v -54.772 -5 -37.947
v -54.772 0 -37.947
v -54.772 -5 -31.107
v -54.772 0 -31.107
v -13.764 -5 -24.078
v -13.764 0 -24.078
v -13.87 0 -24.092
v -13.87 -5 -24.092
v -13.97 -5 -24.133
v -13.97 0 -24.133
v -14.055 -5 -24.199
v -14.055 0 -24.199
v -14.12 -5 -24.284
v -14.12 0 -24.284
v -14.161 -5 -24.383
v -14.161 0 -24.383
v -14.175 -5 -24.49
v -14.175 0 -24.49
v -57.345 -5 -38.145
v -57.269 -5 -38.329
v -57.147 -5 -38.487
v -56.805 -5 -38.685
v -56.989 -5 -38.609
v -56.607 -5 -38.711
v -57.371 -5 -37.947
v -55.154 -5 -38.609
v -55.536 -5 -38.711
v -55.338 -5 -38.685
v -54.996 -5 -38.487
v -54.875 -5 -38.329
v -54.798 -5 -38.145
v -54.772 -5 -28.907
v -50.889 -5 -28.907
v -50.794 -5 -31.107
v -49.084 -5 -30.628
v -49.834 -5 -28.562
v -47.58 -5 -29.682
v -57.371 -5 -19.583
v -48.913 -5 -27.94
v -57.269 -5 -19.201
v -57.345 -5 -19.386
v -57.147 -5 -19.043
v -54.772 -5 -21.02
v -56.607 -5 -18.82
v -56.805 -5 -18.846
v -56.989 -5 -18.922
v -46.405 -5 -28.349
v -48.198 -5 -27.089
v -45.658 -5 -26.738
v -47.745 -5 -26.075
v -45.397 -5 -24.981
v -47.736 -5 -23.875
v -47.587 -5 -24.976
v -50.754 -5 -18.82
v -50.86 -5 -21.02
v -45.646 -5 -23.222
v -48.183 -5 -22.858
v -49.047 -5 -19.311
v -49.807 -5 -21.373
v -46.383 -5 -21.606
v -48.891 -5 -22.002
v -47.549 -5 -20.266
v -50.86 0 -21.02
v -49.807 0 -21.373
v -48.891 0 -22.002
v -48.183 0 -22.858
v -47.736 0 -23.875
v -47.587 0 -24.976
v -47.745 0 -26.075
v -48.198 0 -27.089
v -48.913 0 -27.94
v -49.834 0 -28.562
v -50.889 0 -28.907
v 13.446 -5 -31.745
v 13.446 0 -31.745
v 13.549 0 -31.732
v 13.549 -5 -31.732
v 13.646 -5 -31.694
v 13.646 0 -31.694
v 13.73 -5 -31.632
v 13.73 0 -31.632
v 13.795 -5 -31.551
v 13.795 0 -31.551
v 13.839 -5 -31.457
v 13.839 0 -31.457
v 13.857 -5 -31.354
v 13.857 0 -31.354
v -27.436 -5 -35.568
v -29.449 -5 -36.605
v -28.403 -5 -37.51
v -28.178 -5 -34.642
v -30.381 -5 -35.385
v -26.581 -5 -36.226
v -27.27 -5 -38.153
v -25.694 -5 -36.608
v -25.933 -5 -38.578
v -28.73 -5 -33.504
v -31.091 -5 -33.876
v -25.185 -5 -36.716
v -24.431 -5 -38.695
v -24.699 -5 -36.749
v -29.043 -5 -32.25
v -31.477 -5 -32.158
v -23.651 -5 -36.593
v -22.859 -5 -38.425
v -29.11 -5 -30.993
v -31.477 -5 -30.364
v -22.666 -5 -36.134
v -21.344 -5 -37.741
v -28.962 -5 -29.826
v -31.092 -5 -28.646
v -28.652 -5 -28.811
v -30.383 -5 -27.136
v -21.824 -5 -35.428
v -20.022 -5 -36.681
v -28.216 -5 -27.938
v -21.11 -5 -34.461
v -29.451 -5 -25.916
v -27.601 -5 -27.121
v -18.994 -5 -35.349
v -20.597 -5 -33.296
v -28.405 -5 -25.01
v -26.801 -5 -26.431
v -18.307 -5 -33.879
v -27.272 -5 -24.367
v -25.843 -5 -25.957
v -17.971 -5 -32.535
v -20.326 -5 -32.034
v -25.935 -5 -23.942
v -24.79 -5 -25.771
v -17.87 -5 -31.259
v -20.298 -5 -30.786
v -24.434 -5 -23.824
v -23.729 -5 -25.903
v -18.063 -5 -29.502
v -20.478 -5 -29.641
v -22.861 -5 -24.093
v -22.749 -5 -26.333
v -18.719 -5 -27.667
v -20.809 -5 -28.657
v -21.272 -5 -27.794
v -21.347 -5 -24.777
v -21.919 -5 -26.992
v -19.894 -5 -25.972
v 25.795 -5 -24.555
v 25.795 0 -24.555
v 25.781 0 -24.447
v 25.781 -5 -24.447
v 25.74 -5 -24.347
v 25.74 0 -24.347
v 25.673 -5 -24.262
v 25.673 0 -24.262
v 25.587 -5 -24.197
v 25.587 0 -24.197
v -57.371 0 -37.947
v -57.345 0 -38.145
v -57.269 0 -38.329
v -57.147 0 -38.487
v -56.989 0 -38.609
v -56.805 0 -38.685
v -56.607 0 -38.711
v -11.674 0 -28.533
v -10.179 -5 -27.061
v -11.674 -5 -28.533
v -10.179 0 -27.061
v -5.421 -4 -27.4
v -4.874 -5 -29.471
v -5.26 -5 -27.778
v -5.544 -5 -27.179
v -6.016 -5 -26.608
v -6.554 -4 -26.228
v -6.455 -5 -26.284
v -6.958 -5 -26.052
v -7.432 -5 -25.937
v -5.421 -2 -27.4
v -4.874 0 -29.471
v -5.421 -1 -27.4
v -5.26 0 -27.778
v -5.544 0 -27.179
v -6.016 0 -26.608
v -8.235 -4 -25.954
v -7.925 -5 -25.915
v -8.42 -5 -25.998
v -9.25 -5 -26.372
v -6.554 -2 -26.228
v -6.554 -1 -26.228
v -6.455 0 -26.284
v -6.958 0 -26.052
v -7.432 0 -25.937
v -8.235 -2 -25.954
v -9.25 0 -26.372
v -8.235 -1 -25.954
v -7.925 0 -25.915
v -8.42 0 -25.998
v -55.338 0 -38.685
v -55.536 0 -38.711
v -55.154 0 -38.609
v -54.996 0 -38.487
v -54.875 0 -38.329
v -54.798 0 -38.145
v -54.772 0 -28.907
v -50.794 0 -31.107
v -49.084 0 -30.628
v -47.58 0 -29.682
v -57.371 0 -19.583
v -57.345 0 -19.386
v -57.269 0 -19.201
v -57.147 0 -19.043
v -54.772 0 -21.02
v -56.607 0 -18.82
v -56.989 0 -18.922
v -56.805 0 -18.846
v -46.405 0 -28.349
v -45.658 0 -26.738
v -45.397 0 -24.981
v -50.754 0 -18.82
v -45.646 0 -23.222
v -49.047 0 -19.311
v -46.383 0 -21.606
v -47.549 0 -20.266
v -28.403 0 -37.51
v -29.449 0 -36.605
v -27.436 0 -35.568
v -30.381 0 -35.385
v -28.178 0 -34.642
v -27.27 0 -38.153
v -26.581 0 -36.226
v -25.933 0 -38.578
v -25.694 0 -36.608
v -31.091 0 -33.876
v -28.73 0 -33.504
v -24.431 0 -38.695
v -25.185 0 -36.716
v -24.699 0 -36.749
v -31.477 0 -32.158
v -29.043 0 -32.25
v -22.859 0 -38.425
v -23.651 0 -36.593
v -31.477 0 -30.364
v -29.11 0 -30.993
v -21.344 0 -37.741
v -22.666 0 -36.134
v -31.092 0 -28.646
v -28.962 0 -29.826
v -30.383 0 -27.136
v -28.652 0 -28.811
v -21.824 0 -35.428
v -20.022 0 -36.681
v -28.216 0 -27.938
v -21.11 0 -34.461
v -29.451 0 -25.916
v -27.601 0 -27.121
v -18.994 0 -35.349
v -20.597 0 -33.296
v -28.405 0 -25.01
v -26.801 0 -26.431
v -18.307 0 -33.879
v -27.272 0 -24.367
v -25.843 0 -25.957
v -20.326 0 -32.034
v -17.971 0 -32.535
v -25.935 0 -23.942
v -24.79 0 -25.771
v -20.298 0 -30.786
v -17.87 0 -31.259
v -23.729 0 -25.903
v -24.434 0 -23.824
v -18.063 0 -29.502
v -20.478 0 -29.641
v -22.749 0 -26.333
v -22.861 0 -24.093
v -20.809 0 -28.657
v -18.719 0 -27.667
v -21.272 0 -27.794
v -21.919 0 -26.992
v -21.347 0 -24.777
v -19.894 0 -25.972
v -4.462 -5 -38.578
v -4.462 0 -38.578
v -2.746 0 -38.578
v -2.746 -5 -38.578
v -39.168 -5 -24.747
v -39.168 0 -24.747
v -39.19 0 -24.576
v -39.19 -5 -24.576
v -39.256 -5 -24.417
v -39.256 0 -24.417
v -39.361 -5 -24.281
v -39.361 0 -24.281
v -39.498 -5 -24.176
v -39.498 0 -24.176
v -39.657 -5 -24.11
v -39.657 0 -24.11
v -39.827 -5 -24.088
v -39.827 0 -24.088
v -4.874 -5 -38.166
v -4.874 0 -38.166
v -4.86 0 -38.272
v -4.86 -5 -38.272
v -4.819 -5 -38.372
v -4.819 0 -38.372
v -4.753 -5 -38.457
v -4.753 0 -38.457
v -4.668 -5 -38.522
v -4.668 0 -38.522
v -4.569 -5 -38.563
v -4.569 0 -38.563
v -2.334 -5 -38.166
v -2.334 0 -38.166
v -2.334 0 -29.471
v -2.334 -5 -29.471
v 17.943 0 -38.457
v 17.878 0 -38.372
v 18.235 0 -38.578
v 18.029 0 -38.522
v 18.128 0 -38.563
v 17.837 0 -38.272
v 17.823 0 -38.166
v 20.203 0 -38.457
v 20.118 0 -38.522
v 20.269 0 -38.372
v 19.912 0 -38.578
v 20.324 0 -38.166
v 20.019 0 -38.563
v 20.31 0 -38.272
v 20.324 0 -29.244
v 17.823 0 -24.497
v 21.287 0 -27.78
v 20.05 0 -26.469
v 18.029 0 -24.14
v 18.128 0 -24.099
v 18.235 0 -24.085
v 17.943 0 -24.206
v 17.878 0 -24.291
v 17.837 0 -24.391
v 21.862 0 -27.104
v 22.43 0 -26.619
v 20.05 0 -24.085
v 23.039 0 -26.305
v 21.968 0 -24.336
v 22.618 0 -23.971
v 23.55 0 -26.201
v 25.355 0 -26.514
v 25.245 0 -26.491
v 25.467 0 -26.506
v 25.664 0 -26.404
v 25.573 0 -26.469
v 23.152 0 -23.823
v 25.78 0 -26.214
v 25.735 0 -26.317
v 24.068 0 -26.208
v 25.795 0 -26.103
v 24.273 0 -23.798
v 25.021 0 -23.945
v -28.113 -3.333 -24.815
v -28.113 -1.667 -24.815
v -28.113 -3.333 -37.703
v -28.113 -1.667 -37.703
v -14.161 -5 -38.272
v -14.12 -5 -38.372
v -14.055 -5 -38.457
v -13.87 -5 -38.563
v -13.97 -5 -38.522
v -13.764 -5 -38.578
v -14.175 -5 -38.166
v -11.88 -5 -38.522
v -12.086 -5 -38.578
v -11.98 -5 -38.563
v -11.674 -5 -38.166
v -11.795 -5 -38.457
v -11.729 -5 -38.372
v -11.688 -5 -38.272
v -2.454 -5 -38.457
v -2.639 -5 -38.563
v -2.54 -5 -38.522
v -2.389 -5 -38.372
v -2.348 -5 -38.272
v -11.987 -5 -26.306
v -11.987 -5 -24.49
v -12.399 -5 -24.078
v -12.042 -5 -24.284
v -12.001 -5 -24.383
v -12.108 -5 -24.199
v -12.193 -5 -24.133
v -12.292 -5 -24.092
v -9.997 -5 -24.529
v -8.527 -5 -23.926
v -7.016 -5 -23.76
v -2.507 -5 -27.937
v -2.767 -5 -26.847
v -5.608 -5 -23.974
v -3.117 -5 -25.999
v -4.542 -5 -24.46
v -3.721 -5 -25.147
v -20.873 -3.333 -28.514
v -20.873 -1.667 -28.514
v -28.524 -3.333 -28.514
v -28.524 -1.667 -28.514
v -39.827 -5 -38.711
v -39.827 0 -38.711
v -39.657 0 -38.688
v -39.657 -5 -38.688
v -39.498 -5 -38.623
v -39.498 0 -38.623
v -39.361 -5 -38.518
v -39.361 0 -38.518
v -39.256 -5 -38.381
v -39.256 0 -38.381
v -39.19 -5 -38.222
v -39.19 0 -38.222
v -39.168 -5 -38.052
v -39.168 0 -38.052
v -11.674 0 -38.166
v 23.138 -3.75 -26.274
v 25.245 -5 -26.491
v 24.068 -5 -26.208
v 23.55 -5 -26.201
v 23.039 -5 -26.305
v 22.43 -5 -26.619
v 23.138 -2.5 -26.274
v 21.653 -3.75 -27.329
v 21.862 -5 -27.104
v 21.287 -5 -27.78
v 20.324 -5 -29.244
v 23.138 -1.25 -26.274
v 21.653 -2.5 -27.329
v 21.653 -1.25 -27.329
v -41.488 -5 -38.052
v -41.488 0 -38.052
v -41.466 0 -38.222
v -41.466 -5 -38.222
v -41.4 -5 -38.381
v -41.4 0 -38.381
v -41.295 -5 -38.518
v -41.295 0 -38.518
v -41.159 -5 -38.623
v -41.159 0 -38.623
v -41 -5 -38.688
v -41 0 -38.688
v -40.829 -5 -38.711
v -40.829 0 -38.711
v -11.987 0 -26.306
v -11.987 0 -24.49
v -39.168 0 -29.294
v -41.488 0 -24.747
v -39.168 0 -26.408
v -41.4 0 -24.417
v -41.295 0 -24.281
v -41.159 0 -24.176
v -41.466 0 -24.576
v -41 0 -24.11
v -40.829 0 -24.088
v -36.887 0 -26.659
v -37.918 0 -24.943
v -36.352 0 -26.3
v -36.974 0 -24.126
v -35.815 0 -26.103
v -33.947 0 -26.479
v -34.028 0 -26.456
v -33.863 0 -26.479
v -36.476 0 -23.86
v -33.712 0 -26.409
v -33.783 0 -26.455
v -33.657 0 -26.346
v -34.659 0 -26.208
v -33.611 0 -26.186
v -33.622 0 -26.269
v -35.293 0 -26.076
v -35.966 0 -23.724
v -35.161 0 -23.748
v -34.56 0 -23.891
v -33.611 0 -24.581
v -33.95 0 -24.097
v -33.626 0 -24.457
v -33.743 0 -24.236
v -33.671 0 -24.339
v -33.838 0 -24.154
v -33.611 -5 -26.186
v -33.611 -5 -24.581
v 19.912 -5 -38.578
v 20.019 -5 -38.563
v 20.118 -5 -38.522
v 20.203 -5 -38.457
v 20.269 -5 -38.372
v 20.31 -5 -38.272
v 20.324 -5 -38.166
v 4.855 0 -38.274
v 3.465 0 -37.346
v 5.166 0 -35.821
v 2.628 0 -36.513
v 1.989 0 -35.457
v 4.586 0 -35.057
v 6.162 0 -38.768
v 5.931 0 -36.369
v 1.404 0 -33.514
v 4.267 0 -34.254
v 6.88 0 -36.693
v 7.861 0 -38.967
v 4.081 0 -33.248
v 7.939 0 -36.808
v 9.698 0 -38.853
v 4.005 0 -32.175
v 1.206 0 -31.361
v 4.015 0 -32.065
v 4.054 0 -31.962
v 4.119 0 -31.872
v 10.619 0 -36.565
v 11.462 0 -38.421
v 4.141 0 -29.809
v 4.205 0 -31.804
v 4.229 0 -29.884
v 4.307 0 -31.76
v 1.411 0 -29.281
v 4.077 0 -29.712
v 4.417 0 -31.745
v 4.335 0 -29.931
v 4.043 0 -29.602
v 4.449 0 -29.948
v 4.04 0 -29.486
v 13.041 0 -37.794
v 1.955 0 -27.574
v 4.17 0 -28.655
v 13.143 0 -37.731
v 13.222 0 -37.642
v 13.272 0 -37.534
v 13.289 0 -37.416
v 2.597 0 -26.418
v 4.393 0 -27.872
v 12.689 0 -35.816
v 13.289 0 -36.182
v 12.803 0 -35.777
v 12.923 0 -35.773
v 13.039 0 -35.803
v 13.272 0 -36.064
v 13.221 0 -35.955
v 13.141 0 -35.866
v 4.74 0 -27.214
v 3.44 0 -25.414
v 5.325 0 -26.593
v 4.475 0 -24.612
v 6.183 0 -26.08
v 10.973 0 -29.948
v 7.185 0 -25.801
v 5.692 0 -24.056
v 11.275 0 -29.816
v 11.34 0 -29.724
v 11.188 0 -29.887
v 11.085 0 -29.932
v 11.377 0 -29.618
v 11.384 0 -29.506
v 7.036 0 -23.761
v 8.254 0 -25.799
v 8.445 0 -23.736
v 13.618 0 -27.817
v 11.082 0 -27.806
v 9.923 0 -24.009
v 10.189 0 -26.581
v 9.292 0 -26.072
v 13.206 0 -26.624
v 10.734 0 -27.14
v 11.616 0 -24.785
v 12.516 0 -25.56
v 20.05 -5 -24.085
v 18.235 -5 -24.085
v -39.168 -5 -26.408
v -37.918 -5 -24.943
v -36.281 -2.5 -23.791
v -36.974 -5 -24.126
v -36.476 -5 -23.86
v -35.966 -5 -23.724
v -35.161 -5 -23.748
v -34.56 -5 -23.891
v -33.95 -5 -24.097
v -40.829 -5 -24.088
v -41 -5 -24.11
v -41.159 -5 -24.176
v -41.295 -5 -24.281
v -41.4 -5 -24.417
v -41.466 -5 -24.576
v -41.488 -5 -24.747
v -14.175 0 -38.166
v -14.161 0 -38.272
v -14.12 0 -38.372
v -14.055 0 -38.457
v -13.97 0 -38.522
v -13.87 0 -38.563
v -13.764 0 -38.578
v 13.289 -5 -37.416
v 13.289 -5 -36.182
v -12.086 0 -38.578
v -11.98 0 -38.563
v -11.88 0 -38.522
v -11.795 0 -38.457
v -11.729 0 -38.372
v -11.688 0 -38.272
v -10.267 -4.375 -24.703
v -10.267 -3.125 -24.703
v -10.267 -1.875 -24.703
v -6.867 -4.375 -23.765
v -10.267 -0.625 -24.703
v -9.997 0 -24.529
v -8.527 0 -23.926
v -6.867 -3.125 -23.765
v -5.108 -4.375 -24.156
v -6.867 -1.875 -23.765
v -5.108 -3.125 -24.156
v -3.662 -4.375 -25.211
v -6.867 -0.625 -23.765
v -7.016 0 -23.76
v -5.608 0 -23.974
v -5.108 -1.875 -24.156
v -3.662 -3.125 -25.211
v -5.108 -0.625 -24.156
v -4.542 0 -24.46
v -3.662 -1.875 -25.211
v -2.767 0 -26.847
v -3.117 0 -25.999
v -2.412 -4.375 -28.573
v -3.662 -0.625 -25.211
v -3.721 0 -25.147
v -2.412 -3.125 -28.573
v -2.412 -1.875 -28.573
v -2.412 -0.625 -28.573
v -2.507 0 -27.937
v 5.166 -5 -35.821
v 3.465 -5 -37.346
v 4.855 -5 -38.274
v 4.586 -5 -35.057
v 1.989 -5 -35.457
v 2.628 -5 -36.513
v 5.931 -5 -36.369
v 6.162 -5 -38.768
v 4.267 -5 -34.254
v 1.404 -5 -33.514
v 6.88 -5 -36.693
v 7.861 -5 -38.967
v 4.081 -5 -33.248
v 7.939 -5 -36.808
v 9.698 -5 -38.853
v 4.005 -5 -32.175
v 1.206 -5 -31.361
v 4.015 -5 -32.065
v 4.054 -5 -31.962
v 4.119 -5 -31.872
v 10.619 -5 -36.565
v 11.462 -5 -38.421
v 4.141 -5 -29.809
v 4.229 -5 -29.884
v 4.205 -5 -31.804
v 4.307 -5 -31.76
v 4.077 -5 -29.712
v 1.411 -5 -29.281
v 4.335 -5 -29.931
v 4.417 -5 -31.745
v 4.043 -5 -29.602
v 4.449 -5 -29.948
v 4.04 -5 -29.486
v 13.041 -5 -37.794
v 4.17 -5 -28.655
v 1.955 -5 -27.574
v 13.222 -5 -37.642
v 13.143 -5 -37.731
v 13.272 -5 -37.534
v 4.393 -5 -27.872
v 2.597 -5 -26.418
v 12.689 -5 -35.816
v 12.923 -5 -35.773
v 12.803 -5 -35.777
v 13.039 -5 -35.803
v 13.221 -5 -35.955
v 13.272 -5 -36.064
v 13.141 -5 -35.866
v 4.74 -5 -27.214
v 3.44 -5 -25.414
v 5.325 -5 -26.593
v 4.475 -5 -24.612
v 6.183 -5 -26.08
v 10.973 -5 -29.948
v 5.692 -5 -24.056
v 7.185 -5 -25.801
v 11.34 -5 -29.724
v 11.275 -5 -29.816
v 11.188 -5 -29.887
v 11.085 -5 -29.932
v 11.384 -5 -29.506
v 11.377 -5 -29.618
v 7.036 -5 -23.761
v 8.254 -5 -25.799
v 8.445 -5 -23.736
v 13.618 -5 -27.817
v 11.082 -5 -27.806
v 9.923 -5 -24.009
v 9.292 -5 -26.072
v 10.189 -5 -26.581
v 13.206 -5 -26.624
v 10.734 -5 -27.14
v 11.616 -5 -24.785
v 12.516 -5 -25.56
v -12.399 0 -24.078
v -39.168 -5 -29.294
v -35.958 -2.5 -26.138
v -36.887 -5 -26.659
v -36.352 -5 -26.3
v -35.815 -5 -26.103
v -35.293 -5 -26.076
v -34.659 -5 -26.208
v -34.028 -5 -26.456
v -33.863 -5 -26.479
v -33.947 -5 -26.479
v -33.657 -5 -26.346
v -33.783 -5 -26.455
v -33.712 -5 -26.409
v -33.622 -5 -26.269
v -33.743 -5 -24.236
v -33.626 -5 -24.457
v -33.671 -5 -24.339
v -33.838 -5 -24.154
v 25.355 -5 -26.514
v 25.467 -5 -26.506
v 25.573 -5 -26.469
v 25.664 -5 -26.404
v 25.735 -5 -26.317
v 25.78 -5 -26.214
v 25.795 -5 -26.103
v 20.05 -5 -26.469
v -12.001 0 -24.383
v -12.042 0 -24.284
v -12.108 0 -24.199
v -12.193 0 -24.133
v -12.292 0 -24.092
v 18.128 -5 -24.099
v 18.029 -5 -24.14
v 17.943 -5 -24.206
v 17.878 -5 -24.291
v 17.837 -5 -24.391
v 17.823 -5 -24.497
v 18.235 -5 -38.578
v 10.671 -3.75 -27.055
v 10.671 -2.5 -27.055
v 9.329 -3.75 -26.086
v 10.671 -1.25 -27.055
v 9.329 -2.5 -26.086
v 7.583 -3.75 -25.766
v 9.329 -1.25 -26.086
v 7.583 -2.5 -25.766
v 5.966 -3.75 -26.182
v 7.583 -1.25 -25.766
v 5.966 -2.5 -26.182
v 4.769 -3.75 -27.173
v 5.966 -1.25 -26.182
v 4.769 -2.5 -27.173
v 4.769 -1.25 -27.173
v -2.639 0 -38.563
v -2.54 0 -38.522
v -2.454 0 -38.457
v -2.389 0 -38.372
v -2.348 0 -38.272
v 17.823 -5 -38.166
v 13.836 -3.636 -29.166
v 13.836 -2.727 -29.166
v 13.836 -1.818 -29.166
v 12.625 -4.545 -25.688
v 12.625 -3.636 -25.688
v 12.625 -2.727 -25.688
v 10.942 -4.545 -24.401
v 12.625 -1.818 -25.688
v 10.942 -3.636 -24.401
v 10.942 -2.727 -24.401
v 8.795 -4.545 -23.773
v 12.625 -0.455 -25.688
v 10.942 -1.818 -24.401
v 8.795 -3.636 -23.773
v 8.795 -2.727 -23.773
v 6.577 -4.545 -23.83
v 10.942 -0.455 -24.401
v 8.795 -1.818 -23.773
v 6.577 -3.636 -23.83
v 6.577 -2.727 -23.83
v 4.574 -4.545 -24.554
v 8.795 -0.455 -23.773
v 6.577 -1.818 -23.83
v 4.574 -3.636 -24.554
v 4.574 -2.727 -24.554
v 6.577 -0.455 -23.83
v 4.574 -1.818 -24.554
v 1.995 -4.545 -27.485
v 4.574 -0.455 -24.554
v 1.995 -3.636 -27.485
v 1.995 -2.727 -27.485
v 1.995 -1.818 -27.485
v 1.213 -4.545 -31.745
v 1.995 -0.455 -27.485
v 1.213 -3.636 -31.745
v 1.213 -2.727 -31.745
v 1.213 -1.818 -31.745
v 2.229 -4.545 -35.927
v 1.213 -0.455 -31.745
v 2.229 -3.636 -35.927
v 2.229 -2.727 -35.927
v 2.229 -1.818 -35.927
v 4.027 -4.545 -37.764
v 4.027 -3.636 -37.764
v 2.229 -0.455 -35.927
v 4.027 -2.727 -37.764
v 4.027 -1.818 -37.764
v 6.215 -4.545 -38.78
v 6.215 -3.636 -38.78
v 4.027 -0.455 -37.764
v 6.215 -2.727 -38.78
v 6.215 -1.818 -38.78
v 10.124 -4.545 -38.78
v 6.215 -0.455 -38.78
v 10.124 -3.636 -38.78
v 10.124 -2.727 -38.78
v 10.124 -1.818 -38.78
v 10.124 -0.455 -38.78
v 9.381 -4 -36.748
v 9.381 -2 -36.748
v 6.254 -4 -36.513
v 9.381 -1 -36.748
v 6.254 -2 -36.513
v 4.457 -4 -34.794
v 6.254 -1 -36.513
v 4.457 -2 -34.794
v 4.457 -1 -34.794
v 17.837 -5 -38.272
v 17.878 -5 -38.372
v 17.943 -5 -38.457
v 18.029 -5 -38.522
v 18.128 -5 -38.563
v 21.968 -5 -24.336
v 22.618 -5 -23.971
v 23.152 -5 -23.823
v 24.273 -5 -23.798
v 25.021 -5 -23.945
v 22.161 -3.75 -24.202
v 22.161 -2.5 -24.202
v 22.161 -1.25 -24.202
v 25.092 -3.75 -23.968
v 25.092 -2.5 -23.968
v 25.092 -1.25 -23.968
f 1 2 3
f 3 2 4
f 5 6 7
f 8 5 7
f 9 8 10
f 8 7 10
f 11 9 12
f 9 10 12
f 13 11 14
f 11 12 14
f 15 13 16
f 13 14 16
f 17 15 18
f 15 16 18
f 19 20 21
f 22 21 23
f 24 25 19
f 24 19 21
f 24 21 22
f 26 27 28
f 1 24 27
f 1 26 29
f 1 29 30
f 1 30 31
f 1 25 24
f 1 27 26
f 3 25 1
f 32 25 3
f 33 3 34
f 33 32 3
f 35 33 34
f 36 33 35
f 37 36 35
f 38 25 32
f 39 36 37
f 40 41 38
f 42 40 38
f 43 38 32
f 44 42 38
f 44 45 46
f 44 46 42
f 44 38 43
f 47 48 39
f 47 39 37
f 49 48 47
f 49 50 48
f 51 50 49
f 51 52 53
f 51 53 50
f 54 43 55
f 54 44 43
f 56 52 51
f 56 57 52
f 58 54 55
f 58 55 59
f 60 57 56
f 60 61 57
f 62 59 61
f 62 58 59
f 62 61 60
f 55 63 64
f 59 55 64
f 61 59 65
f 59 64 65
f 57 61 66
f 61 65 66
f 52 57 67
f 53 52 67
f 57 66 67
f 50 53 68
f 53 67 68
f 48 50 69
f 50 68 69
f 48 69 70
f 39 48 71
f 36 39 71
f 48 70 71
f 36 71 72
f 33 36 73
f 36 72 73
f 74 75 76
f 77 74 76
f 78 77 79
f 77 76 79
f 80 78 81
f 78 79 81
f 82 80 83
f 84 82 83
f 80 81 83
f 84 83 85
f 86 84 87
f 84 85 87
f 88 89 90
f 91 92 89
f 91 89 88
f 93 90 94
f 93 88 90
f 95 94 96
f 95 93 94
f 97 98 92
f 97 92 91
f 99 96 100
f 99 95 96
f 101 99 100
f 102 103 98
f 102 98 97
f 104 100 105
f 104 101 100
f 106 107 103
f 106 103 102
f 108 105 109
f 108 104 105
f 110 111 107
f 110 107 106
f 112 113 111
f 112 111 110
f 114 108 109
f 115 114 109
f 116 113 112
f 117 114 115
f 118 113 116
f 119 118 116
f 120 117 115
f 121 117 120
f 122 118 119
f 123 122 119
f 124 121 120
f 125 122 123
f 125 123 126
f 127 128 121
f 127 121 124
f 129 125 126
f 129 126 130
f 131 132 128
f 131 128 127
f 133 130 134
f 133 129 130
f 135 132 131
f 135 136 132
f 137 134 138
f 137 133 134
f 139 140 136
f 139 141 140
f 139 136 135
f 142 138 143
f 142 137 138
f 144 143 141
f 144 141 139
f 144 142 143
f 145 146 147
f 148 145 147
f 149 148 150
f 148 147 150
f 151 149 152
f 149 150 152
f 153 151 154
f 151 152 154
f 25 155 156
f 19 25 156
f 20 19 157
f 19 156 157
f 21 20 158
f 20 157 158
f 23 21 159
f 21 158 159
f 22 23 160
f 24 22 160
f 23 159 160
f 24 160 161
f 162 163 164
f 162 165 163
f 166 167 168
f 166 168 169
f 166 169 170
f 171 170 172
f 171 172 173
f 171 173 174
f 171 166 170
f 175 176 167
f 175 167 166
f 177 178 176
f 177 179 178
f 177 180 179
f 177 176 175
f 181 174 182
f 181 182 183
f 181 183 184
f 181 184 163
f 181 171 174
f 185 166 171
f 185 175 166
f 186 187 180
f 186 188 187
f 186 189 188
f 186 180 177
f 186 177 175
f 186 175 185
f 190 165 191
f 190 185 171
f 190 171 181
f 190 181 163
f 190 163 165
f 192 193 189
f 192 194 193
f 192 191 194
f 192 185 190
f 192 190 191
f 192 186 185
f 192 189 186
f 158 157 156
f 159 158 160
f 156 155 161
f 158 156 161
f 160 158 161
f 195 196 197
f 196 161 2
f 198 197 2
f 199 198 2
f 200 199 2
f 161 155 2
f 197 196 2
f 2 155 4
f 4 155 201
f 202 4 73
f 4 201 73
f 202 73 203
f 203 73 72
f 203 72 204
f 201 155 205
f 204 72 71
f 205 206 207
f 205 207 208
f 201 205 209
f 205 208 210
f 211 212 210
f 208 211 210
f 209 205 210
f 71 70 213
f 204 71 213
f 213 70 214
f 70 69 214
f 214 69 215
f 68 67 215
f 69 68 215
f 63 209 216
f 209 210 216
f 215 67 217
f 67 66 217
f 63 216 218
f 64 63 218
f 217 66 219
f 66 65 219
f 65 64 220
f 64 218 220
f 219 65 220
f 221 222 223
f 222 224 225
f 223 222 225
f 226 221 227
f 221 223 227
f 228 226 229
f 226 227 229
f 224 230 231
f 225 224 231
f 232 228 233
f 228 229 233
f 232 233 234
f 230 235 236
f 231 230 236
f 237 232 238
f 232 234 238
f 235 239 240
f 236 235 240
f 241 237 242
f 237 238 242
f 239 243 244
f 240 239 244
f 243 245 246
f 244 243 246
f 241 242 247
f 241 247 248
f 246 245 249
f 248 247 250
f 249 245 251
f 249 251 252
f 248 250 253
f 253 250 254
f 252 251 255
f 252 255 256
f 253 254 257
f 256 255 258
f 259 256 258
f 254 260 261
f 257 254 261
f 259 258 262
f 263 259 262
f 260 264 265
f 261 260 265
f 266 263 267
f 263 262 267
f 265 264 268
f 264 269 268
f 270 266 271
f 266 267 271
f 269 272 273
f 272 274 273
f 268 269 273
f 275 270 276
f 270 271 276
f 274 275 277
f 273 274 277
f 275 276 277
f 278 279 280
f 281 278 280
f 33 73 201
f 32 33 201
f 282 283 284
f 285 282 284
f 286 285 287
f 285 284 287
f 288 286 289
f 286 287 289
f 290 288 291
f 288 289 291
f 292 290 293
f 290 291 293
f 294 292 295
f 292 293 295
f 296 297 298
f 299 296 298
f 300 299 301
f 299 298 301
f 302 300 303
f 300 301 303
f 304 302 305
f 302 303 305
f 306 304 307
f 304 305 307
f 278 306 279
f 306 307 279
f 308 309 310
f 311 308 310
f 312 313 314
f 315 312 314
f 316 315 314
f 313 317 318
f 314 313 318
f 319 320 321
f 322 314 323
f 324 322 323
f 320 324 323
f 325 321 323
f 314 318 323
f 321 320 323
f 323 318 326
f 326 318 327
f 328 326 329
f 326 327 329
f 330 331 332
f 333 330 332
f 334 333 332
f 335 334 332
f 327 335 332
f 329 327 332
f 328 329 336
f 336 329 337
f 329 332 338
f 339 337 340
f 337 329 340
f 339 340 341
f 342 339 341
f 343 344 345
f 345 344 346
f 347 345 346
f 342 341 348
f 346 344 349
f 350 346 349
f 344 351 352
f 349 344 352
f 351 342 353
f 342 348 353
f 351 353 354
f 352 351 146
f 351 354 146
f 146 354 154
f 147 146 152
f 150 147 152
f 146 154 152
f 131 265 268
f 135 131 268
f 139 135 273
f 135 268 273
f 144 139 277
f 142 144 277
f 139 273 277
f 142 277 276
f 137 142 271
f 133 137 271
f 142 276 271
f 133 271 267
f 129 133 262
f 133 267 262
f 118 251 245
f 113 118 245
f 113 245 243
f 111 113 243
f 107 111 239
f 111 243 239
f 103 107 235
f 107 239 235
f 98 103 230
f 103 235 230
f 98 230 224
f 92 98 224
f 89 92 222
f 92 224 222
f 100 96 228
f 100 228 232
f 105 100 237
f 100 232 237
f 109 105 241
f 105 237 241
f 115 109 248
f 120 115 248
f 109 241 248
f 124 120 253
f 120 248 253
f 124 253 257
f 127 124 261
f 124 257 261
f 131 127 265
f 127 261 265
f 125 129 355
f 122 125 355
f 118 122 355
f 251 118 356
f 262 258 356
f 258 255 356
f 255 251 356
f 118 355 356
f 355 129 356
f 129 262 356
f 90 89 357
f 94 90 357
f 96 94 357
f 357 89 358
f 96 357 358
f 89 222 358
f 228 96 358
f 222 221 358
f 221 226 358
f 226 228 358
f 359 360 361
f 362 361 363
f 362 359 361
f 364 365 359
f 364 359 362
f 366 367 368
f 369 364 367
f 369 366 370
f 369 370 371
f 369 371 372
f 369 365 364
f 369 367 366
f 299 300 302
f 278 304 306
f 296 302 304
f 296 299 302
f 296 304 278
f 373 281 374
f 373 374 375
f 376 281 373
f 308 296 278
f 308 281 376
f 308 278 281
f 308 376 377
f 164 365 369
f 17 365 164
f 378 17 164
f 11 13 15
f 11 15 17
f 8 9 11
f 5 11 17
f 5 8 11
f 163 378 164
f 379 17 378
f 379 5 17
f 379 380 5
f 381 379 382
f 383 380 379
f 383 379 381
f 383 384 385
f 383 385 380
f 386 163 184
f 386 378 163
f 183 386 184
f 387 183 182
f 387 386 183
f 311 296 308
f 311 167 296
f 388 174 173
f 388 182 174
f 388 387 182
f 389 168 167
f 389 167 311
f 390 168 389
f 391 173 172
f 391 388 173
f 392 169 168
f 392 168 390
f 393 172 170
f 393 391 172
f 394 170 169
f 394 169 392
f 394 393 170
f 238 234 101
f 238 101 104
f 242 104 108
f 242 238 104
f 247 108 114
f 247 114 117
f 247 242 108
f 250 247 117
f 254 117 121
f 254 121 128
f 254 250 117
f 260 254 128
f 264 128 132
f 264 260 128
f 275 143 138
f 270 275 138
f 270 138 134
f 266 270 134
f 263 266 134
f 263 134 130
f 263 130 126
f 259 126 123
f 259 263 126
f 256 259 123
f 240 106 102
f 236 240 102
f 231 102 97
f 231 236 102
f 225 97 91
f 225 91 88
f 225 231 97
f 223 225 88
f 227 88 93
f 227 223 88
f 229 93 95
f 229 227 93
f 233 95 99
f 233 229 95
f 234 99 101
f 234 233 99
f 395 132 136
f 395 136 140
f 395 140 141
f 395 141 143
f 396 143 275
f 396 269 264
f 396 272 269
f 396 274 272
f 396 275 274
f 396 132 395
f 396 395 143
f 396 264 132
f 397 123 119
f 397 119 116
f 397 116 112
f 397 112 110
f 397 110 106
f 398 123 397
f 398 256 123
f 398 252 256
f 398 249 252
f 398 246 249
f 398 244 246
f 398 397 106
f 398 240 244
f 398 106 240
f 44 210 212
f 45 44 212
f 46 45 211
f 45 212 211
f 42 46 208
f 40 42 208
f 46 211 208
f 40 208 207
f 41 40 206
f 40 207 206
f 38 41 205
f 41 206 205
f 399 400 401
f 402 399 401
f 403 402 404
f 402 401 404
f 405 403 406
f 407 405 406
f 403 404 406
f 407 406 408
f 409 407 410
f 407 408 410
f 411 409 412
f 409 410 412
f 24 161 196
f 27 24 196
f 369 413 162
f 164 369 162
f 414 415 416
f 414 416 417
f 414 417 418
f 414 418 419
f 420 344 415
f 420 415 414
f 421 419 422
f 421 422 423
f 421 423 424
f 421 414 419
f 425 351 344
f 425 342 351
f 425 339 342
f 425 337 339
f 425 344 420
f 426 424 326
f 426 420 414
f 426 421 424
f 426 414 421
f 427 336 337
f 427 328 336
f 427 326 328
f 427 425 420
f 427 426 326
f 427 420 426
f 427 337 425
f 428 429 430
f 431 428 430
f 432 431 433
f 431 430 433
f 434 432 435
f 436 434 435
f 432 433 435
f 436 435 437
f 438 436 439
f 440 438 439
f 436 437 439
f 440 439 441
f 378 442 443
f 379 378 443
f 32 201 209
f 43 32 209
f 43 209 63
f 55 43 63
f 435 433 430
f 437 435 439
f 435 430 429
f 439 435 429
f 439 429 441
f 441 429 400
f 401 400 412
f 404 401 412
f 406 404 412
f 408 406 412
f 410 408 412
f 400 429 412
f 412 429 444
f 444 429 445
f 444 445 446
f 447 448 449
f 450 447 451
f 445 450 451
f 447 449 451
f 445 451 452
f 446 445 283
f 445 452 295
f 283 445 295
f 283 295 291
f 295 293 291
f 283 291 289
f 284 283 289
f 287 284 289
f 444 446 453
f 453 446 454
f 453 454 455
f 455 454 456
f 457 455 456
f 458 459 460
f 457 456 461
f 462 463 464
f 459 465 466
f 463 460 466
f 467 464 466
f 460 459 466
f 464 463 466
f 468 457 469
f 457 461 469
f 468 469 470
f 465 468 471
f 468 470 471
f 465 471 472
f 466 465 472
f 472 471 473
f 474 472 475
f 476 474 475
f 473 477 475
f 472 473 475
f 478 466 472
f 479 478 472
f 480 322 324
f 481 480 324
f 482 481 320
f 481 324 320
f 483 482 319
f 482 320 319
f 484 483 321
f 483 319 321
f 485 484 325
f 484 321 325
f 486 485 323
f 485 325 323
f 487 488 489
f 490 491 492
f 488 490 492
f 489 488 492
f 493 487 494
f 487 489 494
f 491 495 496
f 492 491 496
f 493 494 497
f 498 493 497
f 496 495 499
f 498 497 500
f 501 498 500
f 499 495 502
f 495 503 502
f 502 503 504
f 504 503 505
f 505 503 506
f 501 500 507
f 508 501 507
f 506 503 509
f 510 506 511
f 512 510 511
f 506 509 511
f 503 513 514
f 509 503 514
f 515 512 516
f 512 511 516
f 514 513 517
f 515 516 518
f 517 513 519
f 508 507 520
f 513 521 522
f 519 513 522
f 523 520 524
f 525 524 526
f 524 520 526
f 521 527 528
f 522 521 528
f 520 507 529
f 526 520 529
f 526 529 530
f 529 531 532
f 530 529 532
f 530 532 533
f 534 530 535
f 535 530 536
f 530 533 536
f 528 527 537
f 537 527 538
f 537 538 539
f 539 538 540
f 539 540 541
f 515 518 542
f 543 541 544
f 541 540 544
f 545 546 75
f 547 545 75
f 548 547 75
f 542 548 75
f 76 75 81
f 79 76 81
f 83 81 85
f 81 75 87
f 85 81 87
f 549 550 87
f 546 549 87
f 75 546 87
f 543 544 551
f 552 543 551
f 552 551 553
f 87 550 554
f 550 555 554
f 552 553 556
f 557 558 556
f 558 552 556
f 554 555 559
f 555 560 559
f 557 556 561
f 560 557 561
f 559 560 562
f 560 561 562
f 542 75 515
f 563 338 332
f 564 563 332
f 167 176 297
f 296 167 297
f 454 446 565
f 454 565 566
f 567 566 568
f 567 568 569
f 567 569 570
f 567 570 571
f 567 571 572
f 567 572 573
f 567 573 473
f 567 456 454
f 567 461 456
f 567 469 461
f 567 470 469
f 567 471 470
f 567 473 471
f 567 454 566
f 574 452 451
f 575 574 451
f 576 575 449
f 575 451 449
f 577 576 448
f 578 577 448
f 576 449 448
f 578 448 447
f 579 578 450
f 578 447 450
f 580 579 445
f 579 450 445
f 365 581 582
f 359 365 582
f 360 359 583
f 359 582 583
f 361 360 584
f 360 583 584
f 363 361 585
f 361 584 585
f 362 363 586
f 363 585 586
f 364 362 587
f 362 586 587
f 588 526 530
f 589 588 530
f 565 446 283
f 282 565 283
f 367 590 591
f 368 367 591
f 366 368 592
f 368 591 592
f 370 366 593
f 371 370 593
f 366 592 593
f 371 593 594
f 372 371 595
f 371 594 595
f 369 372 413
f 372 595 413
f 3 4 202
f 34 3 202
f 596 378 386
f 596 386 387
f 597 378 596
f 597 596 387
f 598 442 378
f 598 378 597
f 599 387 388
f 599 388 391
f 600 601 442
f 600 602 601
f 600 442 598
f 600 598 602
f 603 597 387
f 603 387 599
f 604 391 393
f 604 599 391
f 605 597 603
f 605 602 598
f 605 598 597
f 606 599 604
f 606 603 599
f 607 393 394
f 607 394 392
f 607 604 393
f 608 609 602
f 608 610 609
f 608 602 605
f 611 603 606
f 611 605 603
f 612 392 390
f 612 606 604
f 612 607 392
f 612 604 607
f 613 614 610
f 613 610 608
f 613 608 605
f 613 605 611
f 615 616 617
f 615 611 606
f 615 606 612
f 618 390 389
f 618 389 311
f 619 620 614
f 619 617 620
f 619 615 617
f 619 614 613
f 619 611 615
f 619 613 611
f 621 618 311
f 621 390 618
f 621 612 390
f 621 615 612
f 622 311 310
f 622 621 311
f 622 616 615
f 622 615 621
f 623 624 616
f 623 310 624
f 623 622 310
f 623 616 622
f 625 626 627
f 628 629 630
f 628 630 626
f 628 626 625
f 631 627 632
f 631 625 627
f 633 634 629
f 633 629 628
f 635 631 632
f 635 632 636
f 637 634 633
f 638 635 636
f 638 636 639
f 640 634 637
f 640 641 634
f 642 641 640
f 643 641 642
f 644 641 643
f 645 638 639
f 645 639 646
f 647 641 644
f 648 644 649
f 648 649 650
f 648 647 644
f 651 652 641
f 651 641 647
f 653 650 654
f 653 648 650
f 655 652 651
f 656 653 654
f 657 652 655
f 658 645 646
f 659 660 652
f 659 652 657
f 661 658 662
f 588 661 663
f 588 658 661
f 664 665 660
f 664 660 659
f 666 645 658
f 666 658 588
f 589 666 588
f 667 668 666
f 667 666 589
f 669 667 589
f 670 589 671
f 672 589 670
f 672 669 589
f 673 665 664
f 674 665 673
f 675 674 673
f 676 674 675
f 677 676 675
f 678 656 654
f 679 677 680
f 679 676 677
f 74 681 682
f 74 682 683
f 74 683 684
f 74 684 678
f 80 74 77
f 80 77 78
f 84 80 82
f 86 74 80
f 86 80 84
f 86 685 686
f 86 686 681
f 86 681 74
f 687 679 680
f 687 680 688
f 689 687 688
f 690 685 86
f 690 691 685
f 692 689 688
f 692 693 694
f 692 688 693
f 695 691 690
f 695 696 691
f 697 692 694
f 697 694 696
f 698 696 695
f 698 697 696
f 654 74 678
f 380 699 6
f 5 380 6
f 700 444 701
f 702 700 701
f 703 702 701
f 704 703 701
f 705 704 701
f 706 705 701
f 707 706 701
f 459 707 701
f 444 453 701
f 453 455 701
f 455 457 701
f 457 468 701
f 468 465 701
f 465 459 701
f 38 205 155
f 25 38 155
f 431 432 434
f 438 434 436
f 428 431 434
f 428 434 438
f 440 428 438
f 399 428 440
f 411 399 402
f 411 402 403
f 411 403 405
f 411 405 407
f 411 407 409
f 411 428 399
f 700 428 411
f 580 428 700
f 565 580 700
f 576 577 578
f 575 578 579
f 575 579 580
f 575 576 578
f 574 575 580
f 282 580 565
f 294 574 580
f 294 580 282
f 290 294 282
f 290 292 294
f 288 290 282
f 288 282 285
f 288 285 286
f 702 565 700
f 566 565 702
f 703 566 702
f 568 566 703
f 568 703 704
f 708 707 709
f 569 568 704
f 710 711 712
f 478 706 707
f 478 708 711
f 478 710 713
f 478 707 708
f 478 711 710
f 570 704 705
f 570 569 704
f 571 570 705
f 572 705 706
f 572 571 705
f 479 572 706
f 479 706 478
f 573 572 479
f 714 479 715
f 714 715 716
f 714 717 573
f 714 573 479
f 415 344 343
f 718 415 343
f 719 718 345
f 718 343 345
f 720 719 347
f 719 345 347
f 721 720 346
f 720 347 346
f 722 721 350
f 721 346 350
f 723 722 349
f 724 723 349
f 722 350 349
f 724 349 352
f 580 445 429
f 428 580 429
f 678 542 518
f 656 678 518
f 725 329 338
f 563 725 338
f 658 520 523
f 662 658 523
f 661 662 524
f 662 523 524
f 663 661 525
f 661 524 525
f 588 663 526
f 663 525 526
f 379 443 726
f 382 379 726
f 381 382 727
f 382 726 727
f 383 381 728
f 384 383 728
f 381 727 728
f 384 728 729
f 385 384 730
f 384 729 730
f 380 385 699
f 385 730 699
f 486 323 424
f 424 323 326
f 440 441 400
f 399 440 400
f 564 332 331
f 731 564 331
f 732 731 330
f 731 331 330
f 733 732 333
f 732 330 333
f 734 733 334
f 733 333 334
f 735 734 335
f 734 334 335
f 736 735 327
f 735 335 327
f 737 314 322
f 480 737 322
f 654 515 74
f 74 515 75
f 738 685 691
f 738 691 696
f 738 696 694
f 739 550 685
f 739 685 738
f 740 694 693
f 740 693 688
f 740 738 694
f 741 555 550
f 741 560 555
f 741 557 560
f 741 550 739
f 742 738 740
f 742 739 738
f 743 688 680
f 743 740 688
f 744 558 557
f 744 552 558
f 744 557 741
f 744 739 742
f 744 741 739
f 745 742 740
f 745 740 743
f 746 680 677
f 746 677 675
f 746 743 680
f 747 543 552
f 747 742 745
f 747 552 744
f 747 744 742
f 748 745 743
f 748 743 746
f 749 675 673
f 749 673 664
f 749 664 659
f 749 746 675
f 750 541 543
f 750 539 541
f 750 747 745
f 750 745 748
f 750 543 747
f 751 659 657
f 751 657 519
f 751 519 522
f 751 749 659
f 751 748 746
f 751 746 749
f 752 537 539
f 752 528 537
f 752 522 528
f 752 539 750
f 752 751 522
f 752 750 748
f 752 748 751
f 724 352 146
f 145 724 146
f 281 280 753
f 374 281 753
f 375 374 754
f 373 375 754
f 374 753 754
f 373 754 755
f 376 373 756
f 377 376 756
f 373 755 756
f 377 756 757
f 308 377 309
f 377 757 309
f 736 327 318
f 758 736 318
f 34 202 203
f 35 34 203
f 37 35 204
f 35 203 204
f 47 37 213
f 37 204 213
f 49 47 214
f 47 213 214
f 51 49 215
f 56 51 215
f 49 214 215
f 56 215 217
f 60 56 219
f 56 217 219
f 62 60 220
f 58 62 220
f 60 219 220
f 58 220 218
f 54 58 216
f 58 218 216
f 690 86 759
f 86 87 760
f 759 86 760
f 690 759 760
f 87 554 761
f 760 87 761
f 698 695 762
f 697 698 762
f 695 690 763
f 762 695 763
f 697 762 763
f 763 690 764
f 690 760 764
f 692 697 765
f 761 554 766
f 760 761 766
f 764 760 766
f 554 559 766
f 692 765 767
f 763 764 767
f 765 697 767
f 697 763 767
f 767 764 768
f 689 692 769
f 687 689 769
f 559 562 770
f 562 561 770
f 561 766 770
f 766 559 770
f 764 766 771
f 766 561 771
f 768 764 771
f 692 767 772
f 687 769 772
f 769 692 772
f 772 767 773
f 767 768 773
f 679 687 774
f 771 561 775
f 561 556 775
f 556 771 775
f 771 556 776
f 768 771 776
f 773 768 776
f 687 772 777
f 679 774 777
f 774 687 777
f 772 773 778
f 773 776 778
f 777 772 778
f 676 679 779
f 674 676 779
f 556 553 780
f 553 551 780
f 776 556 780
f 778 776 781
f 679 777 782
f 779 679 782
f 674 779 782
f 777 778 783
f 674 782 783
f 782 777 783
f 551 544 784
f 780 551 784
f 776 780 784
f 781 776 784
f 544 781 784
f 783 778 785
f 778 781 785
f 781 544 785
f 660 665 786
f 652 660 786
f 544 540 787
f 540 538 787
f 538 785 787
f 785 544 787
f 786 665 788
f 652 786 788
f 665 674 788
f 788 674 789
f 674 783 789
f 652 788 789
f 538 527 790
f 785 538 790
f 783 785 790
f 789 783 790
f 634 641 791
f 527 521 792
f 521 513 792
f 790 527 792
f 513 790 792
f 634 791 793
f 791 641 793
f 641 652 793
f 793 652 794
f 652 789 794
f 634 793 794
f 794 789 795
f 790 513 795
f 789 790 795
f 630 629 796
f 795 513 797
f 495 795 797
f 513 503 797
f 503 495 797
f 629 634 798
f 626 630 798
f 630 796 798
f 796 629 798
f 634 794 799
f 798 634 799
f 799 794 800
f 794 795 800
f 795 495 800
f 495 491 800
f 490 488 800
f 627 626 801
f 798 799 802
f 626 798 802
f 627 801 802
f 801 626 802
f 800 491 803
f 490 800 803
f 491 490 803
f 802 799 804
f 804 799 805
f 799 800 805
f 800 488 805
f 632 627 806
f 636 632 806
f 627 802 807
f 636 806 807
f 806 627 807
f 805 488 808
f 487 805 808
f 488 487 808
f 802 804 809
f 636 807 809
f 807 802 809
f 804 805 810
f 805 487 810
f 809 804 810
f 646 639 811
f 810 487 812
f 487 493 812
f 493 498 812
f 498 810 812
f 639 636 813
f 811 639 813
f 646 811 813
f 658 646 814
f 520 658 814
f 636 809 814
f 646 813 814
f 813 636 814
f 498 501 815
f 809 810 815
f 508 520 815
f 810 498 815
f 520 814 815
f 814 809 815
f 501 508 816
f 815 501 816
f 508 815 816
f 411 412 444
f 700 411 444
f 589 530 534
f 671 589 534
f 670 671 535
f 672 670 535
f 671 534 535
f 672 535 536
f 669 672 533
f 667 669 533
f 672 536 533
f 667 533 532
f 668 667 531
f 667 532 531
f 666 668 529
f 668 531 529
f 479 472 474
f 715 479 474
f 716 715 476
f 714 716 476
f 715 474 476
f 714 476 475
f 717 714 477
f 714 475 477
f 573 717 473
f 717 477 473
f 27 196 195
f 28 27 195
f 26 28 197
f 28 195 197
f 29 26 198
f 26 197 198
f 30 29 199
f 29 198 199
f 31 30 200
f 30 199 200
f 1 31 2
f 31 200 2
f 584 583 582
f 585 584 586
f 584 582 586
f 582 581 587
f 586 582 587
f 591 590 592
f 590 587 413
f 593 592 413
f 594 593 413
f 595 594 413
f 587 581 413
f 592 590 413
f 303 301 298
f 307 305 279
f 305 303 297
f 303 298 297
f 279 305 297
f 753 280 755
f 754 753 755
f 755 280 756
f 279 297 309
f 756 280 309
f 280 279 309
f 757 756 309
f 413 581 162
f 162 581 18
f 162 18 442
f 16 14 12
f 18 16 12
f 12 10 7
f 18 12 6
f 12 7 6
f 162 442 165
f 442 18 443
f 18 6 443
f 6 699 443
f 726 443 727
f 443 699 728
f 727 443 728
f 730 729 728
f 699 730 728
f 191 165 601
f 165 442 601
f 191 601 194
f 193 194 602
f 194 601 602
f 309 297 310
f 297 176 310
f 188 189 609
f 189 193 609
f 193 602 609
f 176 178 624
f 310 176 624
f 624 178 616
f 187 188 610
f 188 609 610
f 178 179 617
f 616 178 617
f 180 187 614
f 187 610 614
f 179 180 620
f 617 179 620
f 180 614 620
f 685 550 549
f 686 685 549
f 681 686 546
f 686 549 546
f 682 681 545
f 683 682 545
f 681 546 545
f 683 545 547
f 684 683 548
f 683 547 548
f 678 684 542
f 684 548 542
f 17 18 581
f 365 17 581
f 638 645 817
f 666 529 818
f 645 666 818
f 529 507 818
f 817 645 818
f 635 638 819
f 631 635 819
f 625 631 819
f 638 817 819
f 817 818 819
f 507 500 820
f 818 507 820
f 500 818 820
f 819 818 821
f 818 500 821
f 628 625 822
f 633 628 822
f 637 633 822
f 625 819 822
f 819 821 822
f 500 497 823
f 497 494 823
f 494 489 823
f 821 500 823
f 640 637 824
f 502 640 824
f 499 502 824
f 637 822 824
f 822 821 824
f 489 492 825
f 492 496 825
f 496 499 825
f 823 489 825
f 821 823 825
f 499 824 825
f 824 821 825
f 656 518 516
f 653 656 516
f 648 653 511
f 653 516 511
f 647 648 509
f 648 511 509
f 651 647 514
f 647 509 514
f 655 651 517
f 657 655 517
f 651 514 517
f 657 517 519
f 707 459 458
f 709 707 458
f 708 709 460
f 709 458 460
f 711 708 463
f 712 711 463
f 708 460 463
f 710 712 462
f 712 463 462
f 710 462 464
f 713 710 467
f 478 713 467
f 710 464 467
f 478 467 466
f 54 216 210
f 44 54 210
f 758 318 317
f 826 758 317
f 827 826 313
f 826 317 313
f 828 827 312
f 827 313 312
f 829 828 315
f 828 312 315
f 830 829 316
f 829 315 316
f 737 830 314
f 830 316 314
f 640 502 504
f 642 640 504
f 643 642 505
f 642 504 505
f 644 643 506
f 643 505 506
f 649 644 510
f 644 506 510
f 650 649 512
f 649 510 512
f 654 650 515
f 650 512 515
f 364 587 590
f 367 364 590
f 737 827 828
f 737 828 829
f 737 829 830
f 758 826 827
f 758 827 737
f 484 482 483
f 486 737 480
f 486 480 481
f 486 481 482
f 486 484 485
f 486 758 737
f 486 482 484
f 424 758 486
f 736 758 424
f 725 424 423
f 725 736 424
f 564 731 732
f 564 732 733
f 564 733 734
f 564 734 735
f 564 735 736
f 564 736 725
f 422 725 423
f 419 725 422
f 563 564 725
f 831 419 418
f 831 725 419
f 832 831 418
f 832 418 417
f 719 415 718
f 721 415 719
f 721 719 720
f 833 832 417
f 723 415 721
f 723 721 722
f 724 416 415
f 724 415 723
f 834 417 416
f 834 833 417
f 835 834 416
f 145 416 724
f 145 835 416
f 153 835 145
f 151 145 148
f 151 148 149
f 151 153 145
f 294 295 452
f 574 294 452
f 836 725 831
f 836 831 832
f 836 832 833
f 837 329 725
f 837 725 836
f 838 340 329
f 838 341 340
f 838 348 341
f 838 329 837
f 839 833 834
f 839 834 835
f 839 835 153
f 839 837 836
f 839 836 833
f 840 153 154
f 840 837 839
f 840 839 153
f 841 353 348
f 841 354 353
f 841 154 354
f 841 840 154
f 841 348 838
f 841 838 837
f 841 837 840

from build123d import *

# Parameters (mm, degrees)
F1_DEPTH = 5


with BuildPart() as f1:
    # F0 (on Front) → F1 (new body)
    with BuildSketch(Plane.XZ):
        with BuildLine():
            ThreePointArc((-57.3708973825, -37.9473655111), (-57.1472743217, -38.4872393373), (-56.6074004954, -38.7108623981))
            Line((-56.6074004954, -38.7108623981), (-55.5357137137, -38.7108623981))
            ThreePointArc((-55.5357137137, -38.7108623981), (-54.9958398875, -38.4872393373), (-54.7722168267, -37.9473655111))
            Line((-54.7722168267, -37.9473655111), (-54.7722168267, -31.1073120683))
            Line((-54.7722168267, -31.1073120683), (-50.7939904928, -31.1073120683))
            ThreePointArc((-50.7939904928, -31.1073120683), (-45.3972658857, -24.9810454764), (-50.7539313278, -18.8197214156))
            Line((-50.7539313278, -18.8197214156), (-54.7722168267, -18.8197214156))
            Line((-54.7722168267, -18.8197214156), (-56.6074004954, -18.8197214156))
            ThreePointArc((-56.6074004954, -18.8197214156), (-57.1472743217, -19.0433444764), (-57.3708973825, -19.5832183027))
            Line((-57.3708973825, -19.5832183027), (-57.3708973825, -37.9473655111))
        make_face()
        with BuildLine():
            Line((-50.8893977888, -28.9073120803), (-54.7722168267, -28.9073120803))
            Line((-54.7722168267, -28.9073120803), (-54.7722168267, -21.0197214037))
            Line((-54.7722168267, -21.0197214037), (-50.8600889766, -21.0197214037))
            ThreePointArc((-50.8600889766, -21.0197214037), (-47.5866158875, -24.975734809), (-50.8893977888, -28.9073120803))
        make_face(mode=Mode.SUBTRACT)
    extrude(amount=F1_DEPTH)


with BuildPart() as f1b:
    # F0 (on Front) → F1, piece 2 (new body)
    with BuildSketch(Plane.XZ):
        with BuildLine():
            ThreePointArc((-41.4881147444, -38.0516472624), (-41.2950351014, -38.5177827551), (-40.8288996087, -38.7108623981))
            Line((-40.8288996087, -38.7108623981), (-39.8272190823, -38.7108623981))
            ThreePointArc((-39.8272190823, -38.7108623981), (-39.3610835895, -38.5177827551), (-39.1680039465, -38.0516472624))
            Line((-39.1680039465, -38.0516472624), (-39.1680039465, -29.2944982648))
            add(Edge.make_bspline(
                [(-39.1680039465, -29.2944982648), (-38.0987558941, -27.8728468146), (-36.3912511699, -25.5923184323), (-34.6675477543, -26.1687633921), (-34.0280171963, -26.4561341571)],
                knots=[0, 0, 0, 0, 0.5778690025, 0.9244045996, 0.9244045996, 0.9244045996, 0.9244045996], degree=3))
            ThreePointArc((-34.0280171963, -26.4561341571), (-33.745793127, -26.43465328), (-33.6105246097, -26.1860284993))
            Line((-33.6105246097, -26.1860284993), (-33.6105246097, -24.5813801146))
            ThreePointArc((-33.6105246097, -24.5813801146), (-33.7037707797, -24.2856056732), (-33.9497898688, -24.0967883642))
            add(Edge.make_bspline(
                [(-39.1680039465, -26.407847181), (-38.2340937948, -25.2488408954), (-36.6156261235, -23.2489376965), (-34.7511420572, -23.8049955085), (-33.9497898688, -24.0967883642)],
                knots=[0, 0, 0, 0, 0.5454681083, 0.9439000882, 0.9439000882, 0.9439000882, 0.9439000882], degree=3))
            Line((-39.1680039465, -26.407847181), (-39.1680039465, -24.7469496562))
            ThreePointArc((-39.1680039465, -24.7469496562), (-39.3610835895, -24.2808141634), (-39.8272190823, -24.0877345204))
            Line((-39.8272190823, -24.0877345204), (-40.8288996087, -24.0877345204))
            ThreePointArc((-40.8288996087, -24.0877345204), (-41.2950351014, -24.2808141634), (-41.4881147444, -24.7469496562))
            Line((-41.4881147444, -24.7469496562), (-41.4881147444, -38.0516472624))
        make_face()
    extrude(amount=F1_DEPTH)


with BuildPart() as f1c:
    # F0 (on Front) → F1, piece 3 (new body)
    with BuildSketch(Plane.XZ):
        with BuildLine():
            add(Edge.make_bspline(
                [(-17.8701467812, -31.2594193965), (-17.8701467812, -18.3712887289), (-28.1127612107, -24.8153540627), (-38.3553756401, -31.2594193965), (-28.1127612107, -37.7034847303), (-17.8701467812, -44.1475500641), (-17.8701467812, -31.2594193965)],
                knots=[4.7123889804, 4.7123889804, 4.7123889804, 6.8067840828, 6.8067840828, 8.9011791852, 8.9011791852, 10.9955742876, 10.9955742876, 10.9955742876], degree=2, weights=[1, 0.5, 1, 0.5, 1, 0.5, 1]))
        make_face()
        with BuildLine():
            add(Edge.make_bspline(
                [(-24.6985564008, -36.7493685335), (-17.0478540379, -36.7493685335), (-20.8732052194, -28.514444828), (-24.6985564008, -20.2795211226), (-28.5239075823, -28.514444828), (-32.3492587637, -36.7493685335), (-24.6985564008, -36.7493685335)],
                knots=[0, 0, 0, 2.0943951024, 2.0943951024, 4.1887902048, 4.1887902048, 6.2831853072, 6.2831853072, 6.2831853072], degree=2, weights=[1, 0.5, 1, 0.5, 1, 0.5, 1]))
        make_face(mode=Mode.SUBTRACT)
    extrude(amount=F1_DEPTH)


with BuildPart() as f1d:
    # F0 (on Front) → F1, piece 4 (new body)
    with BuildSketch(Plane.XZ):
        with BuildLine():
            Line((-14.1754979268, -24.4900242861), (-14.1754979268, -38.1656015788))
            ThreePointArc((-14.1754979268, -38.1656015788), (-14.0548456383, -38.4568819699), (-13.7635652472, -38.5775342584))
            Line((-13.7635652472, -38.5775342584), (-12.0861794304, -38.5775342584))
            ThreePointArc((-12.0861794304, -38.5775342584), (-11.7948990392, -38.4568819699), (-11.6742467508, -38.1656015788))
            Line((-11.6742467508, -38.1656015788), (-11.6742467508, -28.5334456712))
            add(Edge.make_bspline(
                [(-4.8739695922, -29.4714141637), (-4.9994554012, -28.7302729222), (-5.2344207875, -27.3425260578), (-6.4646368475, -26.0810983197), (-8.3178840867, -25.7038084645), (-10.157481335, -26.933236038), (-11.1632684135, -27.9943560736), (-11.6742467508, -28.5334456712)],
                knots=[0, 0, 0, 0, 0.2093801261, 0.3920529545, 0.5787116566, 0.7859693947, 1, 1, 1, 1], degree=3))
            Line((-4.8739695922, -29.4714141637), (-4.8739695922, -38.1656015788))
            ThreePointArc((-4.8739695922, -38.1656015788), (-4.7533173037, -38.4568819699), (-4.4620369126, -38.5775342584))
            Line((-4.4620369126, -38.5775342584), (-2.7455695409, -38.5775342584))
            ThreePointArc((-2.7455695409, -38.5775342584), (-2.4542891498, -38.4568819699), (-2.3336368613, -38.1656015788))
            Line((-2.3336368613, -38.1656015788), (-2.3336368613, -29.4714141637))
            add(Edge.make_bspline(
                [(-11.9869038463, -26.3057686388), (-11.4349680147, -25.7169195681), (-10.383596865, -24.5952331525), (-8.5366345888, -23.8380413448), (-6.8699145349, -23.6851887001), (-5.0537828237, -24.0269315175), (-3.5572021599, -25.1399752972), (-2.7143793695, -26.6641212737), (-2.3917433236, -28.5434526787), (-2.3505150533, -29.2018690649), (-2.3336368613, -29.4714141637)],
                knots=[0, 0, 0, 0, 0.1456254693, 0.2773989445, 0.399369542, 0.5268635768, 0.6539506785, 0.7796054064, 0.9097739914, 1, 1, 1, 1], degree=3))
            Line((-11.9869038463, -26.3057686388), (-11.9869038463, -24.4900242861))
            ThreePointArc((-11.9869038463, -24.4900242861), (-12.1075561347, -24.198743895), (-12.3988365259, -24.0780916065))
            Line((-12.3988365259, -24.0780916065), (-13.7635652472, -24.0780916065))
            ThreePointArc((-13.7635652472, -24.0780916065), (-14.0548456383, -24.198743895), (-14.1754979268, -24.4900242861))
        make_face()
    extrude(amount=F1_DEPTH)


with BuildPart() as f1e:
    # F0 (on Front) → F1, piece 5 (new body)
    with BuildSketch(Plane.XZ):
        with BuildLine():
            ThreePointArc((4.0050182512, -32.1753757062), (4.1189267254, -31.8724412312), (4.416551345, -31.7453034222))
            Line((4.416551345, -31.7453034222), (13.445799094, -31.7453034222))
            ThreePointArc((13.445799094, -31.7453034222), (13.7296665689, -31.6318800209), (13.8572113429, -31.3540708383))
            add(Edge.make_bspline(
                [(13.8572113429, -31.3540708383), (13.8916748851, -30.6691115213), (13.9386361123, -28.9701238336), (13.1132151668, -25.2272473933), (8.8183967179, -23.3070957763), (4.3329861411, -24.1178454973), (1.6377476442, -27.3786409834), (0.9197573058, -31.6771530912), (1.8692719943, -36.0651649271), (3.9924985766, -37.8284389041), (6.1647334458, -39.0463171662), (10.1198804911, -39.0188526834), (12.1313817105, -38.1889492423), (13.0413788944, -37.793740922)],
                knots=[0.0124038547, 0.0124038547, 0.0124038547, 0.0124038547, 0.077356865, 0.1697957444, 0.2694664205, 0.3692593406, 0.4644337989, 0.5646724831, 0.6645913193, 0.7418101724, 0.8166297501, 0.9118494682, 0.9926573964, 0.9926573964, 0.9926573964, 0.9926573964], degree=3))
            ThreePointArc((13.0413788944, -37.793740922), (13.2217297142, -37.6418373064), (13.2892178372, -37.4159026258))
            Line((13.2892178372, -37.4159026258), (13.2892178372, -36.1823846709))
            ThreePointArc((13.2892178372, -36.1823846709), (13.0920953905, -35.830894847), (12.6893863479, -35.8158023885))
            add(Edge.make_bspline(
                [(12.6893863479, -35.8158023885), (12.3555910297, -35.986895608), (11.3928463144, -36.4375328647), (9.3909894908, -36.8297985887), (6.1265286013, -36.8881017657), (4.2003350261, -34.9845313228), (4.0464390456, -33.1150890124), (4.0050182512, -32.1753757062)],
                knots=[0.0637612716, 0.0637612716, 0.0637612716, 0.0637612716, 0.1690943703, 0.3598949991, 0.5819543, 0.7797569846, 0.9709053888, 0.9709053888, 0.9709053888, 0.9709053888], degree=3))
        make_face()
        with BuildLine():
            Line((10.9733633066, -29.9475286156), (4.4491132765, -29.9475286156))
            ThreePointArc((4.4491132765, -29.9475286156), (4.1407928852, -29.8087754902), (4.0401783645, -29.4859897847))
            add(Edge.make_bspline(
                [(11.3842104047, -29.5057095759), (11.3183646501, -28.6005295177), (11.0459944465, -26.6463060455), (7.5482890056, -25.2302755334), (4.4818647364, -26.8176958784), (4.1423456713, -28.6437599911), (4.0401783645, -29.4859897847)],
                knots=[0.0342995012, 0.0342995012, 0.0342995012, 0.0342995012, 0.2458420787, 0.5060885268, 0.7584380887, 0.9628040322, 0.9628040322, 0.9628040322, 0.9628040322], degree=3))
            ThreePointArc((11.3842104047, -29.5057095759), (11.2750251213, -29.816110966), (10.9733633066, -29.9475286156))
        make_face(mode=Mode.SUBTRACT)
    extrude(amount=F1_DEPTH)


with BuildPart() as f1f:
    # F0 (on Front) → F1, piece 6 (new body)
    with BuildSketch(Plane.XZ):
        with BuildLine():
            Line((17.8227368742, -24.4971544917), (17.8227368742, -38.1656015788))
            ThreePointArc((17.8227368742, -38.1656015788), (17.9433891627, -38.4568819699), (18.2346695538, -38.5775342584))
            Line((18.2346695538, -38.5775342584), (19.9120553706, -38.5775342584))
            ThreePointArc((19.9120553706, -38.5775342584), (20.2033357618, -38.4568819699), (20.3239880502, -38.1656015788))
            Line((20.3239880502, -38.1656015788), (20.3239880502, -29.2440522462))
            add(Edge.make_bspline(
                [(25.2448575727, -26.4907686655), (25.0605237593, -26.4248620441), (24.430858086, -26.2249022771), (23.0420140992, -26.0600782984), (21.5273213385, -27.2905724247), (20.7412203931, -28.5667212269), (20.3239880502, -29.2440522462)],
                knots=[0.1064073707, 0.1064073707, 0.1064073707, 0.1064073707, 0.2103131098, 0.4474899525, 0.7067487796, 1, 1, 1, 1], degree=3))
            ThreePointArc((25.2448575727, -26.4907686655), (25.6207759226, -26.4396450625), (25.7954746485, -26.102883153))
            Line((25.7954746485, -26.102883153), (25.7954746485, -24.5546942438))
            ThreePointArc((25.7954746485, -24.5546942438), (25.7395660464, -24.3474856804), (25.5870163694, -24.1965229149))
            add(Edge.make_bspline(
                [(20.0504139066, -26.4692269266), (20.7459490575, -25.5640268214), (21.9505430781, -23.9963150634), (23.7117938608, -23.6906900416), (24.975292694, -23.8793955565), (25.4389668875, -24.1124171332), (25.5870163694, -24.1965229149)],
                knots=[0, 0, 0, 0, 0.3455001076, 0.5983699936, 0.8258907133, 0.9435551019, 0.9435551019, 0.9435551019, 0.9435551019], degree=3))
            Line((20.0504139066, -26.4692269266), (20.0504139066, -24.0852218121))
            Line((20.0504139066, -24.0852218121), (18.2346695538, -24.0852218121))
            ThreePointArc((18.2346695538, -24.0852218121), (17.9433891627, -24.2058741006), (17.8227368742, -24.4971544917))
        make_face()
    extrude(amount=F1_DEPTH)


solid = Compound([f1.part, f1b.part, f1c.part, f1d.part, f1e.part, f1f.part])
